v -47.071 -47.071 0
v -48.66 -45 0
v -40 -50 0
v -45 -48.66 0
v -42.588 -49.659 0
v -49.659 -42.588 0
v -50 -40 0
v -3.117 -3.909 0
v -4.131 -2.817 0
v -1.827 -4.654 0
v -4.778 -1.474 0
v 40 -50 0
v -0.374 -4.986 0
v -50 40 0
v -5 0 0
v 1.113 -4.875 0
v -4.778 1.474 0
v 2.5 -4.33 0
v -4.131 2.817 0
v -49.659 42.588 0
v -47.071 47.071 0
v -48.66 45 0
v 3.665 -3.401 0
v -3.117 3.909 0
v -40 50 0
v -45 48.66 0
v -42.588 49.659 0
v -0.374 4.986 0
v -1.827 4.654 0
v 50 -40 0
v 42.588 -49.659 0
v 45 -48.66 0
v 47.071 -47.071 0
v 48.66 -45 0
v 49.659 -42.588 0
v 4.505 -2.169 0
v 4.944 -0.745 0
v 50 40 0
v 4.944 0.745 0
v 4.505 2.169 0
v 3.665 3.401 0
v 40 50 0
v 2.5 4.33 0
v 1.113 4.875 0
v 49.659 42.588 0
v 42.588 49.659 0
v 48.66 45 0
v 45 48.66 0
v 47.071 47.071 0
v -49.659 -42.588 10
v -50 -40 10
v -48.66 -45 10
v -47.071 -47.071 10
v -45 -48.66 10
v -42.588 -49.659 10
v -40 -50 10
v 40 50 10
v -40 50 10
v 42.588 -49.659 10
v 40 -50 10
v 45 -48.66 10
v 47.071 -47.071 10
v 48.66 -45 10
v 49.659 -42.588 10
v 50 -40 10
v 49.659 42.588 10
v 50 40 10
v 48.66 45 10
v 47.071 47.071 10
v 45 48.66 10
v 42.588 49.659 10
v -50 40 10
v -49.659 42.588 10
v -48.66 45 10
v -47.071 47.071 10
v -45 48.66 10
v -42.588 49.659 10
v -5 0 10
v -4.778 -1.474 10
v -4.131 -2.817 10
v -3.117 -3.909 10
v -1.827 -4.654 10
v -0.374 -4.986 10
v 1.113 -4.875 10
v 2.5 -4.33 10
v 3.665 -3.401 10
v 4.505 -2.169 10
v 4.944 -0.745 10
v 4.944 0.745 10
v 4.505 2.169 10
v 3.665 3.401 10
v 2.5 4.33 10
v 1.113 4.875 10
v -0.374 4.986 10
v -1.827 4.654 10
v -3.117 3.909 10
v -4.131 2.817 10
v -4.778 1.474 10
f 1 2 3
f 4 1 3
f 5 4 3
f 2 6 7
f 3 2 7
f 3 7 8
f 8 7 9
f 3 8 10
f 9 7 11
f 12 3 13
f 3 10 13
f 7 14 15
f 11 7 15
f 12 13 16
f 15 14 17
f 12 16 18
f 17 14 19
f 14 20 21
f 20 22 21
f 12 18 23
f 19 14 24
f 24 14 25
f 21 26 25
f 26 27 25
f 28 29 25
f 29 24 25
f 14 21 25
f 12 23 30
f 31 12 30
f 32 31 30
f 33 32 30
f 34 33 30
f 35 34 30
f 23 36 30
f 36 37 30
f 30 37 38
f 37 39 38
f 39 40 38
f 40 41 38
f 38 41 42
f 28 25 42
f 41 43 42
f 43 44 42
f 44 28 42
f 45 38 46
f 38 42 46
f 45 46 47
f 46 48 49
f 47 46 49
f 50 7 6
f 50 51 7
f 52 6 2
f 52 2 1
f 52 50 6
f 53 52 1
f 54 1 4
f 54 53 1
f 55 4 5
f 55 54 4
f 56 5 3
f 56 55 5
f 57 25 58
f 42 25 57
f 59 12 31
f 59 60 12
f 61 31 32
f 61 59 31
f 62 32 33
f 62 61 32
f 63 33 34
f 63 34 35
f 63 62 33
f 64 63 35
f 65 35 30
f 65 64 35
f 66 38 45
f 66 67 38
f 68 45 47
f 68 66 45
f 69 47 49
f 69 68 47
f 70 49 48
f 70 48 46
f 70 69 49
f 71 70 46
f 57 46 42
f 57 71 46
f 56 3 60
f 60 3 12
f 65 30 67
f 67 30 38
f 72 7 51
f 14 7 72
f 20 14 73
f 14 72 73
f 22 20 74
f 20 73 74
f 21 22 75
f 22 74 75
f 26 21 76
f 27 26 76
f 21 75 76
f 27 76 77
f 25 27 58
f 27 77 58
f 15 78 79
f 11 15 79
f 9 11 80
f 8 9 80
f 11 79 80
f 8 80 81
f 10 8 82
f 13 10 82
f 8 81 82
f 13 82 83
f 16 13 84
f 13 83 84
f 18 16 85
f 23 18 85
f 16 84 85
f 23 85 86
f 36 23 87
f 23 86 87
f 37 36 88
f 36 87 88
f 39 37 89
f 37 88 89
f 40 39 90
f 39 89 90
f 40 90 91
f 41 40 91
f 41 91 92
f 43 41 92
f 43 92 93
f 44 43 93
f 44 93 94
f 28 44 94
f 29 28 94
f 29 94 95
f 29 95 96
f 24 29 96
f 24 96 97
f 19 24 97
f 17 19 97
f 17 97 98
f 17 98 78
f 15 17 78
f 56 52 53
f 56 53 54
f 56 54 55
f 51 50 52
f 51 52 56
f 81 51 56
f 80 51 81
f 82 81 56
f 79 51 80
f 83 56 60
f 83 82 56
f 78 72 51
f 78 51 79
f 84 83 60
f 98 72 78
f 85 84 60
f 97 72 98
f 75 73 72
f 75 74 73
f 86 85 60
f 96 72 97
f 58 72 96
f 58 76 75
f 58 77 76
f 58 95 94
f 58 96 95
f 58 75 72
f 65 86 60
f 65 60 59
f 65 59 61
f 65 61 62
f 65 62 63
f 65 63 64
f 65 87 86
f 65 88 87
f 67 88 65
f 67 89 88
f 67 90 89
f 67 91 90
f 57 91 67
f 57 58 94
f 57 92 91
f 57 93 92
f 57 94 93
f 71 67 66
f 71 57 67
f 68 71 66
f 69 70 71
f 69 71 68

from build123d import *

# Parameters (mm, degrees)
F0_W     = 100
F0_H     = 100
F1_DEPTH = 10
F2_R     = 10
F3_D     = 10


with BuildPart() as f1:
    # F0 (on Top) → F1 (new body)
    with BuildSketch(Plane.XY):
        Rectangle(F0_W, F0_H)
    extrude(amount=F1_DEPTH)

    # F2
    f2_edges = [f1.edges().sort_by_distance(p)[0] for p in [
        (-50, -50, 5),
        (50, -50, 5),
        (50, 50, 5),
        (-50, 50, 5),
    ]]
    fillet(f2_edges, radius=F2_R)

    # F3 (through all)
    with Locations(Plane(origin=(0, 0, 0), x_dir=(1, 0, 0), z_dir=(0, 0, -1))):
        with Locations((0, 0)):
            Hole(F3_D / 2)


solid = f1.part
